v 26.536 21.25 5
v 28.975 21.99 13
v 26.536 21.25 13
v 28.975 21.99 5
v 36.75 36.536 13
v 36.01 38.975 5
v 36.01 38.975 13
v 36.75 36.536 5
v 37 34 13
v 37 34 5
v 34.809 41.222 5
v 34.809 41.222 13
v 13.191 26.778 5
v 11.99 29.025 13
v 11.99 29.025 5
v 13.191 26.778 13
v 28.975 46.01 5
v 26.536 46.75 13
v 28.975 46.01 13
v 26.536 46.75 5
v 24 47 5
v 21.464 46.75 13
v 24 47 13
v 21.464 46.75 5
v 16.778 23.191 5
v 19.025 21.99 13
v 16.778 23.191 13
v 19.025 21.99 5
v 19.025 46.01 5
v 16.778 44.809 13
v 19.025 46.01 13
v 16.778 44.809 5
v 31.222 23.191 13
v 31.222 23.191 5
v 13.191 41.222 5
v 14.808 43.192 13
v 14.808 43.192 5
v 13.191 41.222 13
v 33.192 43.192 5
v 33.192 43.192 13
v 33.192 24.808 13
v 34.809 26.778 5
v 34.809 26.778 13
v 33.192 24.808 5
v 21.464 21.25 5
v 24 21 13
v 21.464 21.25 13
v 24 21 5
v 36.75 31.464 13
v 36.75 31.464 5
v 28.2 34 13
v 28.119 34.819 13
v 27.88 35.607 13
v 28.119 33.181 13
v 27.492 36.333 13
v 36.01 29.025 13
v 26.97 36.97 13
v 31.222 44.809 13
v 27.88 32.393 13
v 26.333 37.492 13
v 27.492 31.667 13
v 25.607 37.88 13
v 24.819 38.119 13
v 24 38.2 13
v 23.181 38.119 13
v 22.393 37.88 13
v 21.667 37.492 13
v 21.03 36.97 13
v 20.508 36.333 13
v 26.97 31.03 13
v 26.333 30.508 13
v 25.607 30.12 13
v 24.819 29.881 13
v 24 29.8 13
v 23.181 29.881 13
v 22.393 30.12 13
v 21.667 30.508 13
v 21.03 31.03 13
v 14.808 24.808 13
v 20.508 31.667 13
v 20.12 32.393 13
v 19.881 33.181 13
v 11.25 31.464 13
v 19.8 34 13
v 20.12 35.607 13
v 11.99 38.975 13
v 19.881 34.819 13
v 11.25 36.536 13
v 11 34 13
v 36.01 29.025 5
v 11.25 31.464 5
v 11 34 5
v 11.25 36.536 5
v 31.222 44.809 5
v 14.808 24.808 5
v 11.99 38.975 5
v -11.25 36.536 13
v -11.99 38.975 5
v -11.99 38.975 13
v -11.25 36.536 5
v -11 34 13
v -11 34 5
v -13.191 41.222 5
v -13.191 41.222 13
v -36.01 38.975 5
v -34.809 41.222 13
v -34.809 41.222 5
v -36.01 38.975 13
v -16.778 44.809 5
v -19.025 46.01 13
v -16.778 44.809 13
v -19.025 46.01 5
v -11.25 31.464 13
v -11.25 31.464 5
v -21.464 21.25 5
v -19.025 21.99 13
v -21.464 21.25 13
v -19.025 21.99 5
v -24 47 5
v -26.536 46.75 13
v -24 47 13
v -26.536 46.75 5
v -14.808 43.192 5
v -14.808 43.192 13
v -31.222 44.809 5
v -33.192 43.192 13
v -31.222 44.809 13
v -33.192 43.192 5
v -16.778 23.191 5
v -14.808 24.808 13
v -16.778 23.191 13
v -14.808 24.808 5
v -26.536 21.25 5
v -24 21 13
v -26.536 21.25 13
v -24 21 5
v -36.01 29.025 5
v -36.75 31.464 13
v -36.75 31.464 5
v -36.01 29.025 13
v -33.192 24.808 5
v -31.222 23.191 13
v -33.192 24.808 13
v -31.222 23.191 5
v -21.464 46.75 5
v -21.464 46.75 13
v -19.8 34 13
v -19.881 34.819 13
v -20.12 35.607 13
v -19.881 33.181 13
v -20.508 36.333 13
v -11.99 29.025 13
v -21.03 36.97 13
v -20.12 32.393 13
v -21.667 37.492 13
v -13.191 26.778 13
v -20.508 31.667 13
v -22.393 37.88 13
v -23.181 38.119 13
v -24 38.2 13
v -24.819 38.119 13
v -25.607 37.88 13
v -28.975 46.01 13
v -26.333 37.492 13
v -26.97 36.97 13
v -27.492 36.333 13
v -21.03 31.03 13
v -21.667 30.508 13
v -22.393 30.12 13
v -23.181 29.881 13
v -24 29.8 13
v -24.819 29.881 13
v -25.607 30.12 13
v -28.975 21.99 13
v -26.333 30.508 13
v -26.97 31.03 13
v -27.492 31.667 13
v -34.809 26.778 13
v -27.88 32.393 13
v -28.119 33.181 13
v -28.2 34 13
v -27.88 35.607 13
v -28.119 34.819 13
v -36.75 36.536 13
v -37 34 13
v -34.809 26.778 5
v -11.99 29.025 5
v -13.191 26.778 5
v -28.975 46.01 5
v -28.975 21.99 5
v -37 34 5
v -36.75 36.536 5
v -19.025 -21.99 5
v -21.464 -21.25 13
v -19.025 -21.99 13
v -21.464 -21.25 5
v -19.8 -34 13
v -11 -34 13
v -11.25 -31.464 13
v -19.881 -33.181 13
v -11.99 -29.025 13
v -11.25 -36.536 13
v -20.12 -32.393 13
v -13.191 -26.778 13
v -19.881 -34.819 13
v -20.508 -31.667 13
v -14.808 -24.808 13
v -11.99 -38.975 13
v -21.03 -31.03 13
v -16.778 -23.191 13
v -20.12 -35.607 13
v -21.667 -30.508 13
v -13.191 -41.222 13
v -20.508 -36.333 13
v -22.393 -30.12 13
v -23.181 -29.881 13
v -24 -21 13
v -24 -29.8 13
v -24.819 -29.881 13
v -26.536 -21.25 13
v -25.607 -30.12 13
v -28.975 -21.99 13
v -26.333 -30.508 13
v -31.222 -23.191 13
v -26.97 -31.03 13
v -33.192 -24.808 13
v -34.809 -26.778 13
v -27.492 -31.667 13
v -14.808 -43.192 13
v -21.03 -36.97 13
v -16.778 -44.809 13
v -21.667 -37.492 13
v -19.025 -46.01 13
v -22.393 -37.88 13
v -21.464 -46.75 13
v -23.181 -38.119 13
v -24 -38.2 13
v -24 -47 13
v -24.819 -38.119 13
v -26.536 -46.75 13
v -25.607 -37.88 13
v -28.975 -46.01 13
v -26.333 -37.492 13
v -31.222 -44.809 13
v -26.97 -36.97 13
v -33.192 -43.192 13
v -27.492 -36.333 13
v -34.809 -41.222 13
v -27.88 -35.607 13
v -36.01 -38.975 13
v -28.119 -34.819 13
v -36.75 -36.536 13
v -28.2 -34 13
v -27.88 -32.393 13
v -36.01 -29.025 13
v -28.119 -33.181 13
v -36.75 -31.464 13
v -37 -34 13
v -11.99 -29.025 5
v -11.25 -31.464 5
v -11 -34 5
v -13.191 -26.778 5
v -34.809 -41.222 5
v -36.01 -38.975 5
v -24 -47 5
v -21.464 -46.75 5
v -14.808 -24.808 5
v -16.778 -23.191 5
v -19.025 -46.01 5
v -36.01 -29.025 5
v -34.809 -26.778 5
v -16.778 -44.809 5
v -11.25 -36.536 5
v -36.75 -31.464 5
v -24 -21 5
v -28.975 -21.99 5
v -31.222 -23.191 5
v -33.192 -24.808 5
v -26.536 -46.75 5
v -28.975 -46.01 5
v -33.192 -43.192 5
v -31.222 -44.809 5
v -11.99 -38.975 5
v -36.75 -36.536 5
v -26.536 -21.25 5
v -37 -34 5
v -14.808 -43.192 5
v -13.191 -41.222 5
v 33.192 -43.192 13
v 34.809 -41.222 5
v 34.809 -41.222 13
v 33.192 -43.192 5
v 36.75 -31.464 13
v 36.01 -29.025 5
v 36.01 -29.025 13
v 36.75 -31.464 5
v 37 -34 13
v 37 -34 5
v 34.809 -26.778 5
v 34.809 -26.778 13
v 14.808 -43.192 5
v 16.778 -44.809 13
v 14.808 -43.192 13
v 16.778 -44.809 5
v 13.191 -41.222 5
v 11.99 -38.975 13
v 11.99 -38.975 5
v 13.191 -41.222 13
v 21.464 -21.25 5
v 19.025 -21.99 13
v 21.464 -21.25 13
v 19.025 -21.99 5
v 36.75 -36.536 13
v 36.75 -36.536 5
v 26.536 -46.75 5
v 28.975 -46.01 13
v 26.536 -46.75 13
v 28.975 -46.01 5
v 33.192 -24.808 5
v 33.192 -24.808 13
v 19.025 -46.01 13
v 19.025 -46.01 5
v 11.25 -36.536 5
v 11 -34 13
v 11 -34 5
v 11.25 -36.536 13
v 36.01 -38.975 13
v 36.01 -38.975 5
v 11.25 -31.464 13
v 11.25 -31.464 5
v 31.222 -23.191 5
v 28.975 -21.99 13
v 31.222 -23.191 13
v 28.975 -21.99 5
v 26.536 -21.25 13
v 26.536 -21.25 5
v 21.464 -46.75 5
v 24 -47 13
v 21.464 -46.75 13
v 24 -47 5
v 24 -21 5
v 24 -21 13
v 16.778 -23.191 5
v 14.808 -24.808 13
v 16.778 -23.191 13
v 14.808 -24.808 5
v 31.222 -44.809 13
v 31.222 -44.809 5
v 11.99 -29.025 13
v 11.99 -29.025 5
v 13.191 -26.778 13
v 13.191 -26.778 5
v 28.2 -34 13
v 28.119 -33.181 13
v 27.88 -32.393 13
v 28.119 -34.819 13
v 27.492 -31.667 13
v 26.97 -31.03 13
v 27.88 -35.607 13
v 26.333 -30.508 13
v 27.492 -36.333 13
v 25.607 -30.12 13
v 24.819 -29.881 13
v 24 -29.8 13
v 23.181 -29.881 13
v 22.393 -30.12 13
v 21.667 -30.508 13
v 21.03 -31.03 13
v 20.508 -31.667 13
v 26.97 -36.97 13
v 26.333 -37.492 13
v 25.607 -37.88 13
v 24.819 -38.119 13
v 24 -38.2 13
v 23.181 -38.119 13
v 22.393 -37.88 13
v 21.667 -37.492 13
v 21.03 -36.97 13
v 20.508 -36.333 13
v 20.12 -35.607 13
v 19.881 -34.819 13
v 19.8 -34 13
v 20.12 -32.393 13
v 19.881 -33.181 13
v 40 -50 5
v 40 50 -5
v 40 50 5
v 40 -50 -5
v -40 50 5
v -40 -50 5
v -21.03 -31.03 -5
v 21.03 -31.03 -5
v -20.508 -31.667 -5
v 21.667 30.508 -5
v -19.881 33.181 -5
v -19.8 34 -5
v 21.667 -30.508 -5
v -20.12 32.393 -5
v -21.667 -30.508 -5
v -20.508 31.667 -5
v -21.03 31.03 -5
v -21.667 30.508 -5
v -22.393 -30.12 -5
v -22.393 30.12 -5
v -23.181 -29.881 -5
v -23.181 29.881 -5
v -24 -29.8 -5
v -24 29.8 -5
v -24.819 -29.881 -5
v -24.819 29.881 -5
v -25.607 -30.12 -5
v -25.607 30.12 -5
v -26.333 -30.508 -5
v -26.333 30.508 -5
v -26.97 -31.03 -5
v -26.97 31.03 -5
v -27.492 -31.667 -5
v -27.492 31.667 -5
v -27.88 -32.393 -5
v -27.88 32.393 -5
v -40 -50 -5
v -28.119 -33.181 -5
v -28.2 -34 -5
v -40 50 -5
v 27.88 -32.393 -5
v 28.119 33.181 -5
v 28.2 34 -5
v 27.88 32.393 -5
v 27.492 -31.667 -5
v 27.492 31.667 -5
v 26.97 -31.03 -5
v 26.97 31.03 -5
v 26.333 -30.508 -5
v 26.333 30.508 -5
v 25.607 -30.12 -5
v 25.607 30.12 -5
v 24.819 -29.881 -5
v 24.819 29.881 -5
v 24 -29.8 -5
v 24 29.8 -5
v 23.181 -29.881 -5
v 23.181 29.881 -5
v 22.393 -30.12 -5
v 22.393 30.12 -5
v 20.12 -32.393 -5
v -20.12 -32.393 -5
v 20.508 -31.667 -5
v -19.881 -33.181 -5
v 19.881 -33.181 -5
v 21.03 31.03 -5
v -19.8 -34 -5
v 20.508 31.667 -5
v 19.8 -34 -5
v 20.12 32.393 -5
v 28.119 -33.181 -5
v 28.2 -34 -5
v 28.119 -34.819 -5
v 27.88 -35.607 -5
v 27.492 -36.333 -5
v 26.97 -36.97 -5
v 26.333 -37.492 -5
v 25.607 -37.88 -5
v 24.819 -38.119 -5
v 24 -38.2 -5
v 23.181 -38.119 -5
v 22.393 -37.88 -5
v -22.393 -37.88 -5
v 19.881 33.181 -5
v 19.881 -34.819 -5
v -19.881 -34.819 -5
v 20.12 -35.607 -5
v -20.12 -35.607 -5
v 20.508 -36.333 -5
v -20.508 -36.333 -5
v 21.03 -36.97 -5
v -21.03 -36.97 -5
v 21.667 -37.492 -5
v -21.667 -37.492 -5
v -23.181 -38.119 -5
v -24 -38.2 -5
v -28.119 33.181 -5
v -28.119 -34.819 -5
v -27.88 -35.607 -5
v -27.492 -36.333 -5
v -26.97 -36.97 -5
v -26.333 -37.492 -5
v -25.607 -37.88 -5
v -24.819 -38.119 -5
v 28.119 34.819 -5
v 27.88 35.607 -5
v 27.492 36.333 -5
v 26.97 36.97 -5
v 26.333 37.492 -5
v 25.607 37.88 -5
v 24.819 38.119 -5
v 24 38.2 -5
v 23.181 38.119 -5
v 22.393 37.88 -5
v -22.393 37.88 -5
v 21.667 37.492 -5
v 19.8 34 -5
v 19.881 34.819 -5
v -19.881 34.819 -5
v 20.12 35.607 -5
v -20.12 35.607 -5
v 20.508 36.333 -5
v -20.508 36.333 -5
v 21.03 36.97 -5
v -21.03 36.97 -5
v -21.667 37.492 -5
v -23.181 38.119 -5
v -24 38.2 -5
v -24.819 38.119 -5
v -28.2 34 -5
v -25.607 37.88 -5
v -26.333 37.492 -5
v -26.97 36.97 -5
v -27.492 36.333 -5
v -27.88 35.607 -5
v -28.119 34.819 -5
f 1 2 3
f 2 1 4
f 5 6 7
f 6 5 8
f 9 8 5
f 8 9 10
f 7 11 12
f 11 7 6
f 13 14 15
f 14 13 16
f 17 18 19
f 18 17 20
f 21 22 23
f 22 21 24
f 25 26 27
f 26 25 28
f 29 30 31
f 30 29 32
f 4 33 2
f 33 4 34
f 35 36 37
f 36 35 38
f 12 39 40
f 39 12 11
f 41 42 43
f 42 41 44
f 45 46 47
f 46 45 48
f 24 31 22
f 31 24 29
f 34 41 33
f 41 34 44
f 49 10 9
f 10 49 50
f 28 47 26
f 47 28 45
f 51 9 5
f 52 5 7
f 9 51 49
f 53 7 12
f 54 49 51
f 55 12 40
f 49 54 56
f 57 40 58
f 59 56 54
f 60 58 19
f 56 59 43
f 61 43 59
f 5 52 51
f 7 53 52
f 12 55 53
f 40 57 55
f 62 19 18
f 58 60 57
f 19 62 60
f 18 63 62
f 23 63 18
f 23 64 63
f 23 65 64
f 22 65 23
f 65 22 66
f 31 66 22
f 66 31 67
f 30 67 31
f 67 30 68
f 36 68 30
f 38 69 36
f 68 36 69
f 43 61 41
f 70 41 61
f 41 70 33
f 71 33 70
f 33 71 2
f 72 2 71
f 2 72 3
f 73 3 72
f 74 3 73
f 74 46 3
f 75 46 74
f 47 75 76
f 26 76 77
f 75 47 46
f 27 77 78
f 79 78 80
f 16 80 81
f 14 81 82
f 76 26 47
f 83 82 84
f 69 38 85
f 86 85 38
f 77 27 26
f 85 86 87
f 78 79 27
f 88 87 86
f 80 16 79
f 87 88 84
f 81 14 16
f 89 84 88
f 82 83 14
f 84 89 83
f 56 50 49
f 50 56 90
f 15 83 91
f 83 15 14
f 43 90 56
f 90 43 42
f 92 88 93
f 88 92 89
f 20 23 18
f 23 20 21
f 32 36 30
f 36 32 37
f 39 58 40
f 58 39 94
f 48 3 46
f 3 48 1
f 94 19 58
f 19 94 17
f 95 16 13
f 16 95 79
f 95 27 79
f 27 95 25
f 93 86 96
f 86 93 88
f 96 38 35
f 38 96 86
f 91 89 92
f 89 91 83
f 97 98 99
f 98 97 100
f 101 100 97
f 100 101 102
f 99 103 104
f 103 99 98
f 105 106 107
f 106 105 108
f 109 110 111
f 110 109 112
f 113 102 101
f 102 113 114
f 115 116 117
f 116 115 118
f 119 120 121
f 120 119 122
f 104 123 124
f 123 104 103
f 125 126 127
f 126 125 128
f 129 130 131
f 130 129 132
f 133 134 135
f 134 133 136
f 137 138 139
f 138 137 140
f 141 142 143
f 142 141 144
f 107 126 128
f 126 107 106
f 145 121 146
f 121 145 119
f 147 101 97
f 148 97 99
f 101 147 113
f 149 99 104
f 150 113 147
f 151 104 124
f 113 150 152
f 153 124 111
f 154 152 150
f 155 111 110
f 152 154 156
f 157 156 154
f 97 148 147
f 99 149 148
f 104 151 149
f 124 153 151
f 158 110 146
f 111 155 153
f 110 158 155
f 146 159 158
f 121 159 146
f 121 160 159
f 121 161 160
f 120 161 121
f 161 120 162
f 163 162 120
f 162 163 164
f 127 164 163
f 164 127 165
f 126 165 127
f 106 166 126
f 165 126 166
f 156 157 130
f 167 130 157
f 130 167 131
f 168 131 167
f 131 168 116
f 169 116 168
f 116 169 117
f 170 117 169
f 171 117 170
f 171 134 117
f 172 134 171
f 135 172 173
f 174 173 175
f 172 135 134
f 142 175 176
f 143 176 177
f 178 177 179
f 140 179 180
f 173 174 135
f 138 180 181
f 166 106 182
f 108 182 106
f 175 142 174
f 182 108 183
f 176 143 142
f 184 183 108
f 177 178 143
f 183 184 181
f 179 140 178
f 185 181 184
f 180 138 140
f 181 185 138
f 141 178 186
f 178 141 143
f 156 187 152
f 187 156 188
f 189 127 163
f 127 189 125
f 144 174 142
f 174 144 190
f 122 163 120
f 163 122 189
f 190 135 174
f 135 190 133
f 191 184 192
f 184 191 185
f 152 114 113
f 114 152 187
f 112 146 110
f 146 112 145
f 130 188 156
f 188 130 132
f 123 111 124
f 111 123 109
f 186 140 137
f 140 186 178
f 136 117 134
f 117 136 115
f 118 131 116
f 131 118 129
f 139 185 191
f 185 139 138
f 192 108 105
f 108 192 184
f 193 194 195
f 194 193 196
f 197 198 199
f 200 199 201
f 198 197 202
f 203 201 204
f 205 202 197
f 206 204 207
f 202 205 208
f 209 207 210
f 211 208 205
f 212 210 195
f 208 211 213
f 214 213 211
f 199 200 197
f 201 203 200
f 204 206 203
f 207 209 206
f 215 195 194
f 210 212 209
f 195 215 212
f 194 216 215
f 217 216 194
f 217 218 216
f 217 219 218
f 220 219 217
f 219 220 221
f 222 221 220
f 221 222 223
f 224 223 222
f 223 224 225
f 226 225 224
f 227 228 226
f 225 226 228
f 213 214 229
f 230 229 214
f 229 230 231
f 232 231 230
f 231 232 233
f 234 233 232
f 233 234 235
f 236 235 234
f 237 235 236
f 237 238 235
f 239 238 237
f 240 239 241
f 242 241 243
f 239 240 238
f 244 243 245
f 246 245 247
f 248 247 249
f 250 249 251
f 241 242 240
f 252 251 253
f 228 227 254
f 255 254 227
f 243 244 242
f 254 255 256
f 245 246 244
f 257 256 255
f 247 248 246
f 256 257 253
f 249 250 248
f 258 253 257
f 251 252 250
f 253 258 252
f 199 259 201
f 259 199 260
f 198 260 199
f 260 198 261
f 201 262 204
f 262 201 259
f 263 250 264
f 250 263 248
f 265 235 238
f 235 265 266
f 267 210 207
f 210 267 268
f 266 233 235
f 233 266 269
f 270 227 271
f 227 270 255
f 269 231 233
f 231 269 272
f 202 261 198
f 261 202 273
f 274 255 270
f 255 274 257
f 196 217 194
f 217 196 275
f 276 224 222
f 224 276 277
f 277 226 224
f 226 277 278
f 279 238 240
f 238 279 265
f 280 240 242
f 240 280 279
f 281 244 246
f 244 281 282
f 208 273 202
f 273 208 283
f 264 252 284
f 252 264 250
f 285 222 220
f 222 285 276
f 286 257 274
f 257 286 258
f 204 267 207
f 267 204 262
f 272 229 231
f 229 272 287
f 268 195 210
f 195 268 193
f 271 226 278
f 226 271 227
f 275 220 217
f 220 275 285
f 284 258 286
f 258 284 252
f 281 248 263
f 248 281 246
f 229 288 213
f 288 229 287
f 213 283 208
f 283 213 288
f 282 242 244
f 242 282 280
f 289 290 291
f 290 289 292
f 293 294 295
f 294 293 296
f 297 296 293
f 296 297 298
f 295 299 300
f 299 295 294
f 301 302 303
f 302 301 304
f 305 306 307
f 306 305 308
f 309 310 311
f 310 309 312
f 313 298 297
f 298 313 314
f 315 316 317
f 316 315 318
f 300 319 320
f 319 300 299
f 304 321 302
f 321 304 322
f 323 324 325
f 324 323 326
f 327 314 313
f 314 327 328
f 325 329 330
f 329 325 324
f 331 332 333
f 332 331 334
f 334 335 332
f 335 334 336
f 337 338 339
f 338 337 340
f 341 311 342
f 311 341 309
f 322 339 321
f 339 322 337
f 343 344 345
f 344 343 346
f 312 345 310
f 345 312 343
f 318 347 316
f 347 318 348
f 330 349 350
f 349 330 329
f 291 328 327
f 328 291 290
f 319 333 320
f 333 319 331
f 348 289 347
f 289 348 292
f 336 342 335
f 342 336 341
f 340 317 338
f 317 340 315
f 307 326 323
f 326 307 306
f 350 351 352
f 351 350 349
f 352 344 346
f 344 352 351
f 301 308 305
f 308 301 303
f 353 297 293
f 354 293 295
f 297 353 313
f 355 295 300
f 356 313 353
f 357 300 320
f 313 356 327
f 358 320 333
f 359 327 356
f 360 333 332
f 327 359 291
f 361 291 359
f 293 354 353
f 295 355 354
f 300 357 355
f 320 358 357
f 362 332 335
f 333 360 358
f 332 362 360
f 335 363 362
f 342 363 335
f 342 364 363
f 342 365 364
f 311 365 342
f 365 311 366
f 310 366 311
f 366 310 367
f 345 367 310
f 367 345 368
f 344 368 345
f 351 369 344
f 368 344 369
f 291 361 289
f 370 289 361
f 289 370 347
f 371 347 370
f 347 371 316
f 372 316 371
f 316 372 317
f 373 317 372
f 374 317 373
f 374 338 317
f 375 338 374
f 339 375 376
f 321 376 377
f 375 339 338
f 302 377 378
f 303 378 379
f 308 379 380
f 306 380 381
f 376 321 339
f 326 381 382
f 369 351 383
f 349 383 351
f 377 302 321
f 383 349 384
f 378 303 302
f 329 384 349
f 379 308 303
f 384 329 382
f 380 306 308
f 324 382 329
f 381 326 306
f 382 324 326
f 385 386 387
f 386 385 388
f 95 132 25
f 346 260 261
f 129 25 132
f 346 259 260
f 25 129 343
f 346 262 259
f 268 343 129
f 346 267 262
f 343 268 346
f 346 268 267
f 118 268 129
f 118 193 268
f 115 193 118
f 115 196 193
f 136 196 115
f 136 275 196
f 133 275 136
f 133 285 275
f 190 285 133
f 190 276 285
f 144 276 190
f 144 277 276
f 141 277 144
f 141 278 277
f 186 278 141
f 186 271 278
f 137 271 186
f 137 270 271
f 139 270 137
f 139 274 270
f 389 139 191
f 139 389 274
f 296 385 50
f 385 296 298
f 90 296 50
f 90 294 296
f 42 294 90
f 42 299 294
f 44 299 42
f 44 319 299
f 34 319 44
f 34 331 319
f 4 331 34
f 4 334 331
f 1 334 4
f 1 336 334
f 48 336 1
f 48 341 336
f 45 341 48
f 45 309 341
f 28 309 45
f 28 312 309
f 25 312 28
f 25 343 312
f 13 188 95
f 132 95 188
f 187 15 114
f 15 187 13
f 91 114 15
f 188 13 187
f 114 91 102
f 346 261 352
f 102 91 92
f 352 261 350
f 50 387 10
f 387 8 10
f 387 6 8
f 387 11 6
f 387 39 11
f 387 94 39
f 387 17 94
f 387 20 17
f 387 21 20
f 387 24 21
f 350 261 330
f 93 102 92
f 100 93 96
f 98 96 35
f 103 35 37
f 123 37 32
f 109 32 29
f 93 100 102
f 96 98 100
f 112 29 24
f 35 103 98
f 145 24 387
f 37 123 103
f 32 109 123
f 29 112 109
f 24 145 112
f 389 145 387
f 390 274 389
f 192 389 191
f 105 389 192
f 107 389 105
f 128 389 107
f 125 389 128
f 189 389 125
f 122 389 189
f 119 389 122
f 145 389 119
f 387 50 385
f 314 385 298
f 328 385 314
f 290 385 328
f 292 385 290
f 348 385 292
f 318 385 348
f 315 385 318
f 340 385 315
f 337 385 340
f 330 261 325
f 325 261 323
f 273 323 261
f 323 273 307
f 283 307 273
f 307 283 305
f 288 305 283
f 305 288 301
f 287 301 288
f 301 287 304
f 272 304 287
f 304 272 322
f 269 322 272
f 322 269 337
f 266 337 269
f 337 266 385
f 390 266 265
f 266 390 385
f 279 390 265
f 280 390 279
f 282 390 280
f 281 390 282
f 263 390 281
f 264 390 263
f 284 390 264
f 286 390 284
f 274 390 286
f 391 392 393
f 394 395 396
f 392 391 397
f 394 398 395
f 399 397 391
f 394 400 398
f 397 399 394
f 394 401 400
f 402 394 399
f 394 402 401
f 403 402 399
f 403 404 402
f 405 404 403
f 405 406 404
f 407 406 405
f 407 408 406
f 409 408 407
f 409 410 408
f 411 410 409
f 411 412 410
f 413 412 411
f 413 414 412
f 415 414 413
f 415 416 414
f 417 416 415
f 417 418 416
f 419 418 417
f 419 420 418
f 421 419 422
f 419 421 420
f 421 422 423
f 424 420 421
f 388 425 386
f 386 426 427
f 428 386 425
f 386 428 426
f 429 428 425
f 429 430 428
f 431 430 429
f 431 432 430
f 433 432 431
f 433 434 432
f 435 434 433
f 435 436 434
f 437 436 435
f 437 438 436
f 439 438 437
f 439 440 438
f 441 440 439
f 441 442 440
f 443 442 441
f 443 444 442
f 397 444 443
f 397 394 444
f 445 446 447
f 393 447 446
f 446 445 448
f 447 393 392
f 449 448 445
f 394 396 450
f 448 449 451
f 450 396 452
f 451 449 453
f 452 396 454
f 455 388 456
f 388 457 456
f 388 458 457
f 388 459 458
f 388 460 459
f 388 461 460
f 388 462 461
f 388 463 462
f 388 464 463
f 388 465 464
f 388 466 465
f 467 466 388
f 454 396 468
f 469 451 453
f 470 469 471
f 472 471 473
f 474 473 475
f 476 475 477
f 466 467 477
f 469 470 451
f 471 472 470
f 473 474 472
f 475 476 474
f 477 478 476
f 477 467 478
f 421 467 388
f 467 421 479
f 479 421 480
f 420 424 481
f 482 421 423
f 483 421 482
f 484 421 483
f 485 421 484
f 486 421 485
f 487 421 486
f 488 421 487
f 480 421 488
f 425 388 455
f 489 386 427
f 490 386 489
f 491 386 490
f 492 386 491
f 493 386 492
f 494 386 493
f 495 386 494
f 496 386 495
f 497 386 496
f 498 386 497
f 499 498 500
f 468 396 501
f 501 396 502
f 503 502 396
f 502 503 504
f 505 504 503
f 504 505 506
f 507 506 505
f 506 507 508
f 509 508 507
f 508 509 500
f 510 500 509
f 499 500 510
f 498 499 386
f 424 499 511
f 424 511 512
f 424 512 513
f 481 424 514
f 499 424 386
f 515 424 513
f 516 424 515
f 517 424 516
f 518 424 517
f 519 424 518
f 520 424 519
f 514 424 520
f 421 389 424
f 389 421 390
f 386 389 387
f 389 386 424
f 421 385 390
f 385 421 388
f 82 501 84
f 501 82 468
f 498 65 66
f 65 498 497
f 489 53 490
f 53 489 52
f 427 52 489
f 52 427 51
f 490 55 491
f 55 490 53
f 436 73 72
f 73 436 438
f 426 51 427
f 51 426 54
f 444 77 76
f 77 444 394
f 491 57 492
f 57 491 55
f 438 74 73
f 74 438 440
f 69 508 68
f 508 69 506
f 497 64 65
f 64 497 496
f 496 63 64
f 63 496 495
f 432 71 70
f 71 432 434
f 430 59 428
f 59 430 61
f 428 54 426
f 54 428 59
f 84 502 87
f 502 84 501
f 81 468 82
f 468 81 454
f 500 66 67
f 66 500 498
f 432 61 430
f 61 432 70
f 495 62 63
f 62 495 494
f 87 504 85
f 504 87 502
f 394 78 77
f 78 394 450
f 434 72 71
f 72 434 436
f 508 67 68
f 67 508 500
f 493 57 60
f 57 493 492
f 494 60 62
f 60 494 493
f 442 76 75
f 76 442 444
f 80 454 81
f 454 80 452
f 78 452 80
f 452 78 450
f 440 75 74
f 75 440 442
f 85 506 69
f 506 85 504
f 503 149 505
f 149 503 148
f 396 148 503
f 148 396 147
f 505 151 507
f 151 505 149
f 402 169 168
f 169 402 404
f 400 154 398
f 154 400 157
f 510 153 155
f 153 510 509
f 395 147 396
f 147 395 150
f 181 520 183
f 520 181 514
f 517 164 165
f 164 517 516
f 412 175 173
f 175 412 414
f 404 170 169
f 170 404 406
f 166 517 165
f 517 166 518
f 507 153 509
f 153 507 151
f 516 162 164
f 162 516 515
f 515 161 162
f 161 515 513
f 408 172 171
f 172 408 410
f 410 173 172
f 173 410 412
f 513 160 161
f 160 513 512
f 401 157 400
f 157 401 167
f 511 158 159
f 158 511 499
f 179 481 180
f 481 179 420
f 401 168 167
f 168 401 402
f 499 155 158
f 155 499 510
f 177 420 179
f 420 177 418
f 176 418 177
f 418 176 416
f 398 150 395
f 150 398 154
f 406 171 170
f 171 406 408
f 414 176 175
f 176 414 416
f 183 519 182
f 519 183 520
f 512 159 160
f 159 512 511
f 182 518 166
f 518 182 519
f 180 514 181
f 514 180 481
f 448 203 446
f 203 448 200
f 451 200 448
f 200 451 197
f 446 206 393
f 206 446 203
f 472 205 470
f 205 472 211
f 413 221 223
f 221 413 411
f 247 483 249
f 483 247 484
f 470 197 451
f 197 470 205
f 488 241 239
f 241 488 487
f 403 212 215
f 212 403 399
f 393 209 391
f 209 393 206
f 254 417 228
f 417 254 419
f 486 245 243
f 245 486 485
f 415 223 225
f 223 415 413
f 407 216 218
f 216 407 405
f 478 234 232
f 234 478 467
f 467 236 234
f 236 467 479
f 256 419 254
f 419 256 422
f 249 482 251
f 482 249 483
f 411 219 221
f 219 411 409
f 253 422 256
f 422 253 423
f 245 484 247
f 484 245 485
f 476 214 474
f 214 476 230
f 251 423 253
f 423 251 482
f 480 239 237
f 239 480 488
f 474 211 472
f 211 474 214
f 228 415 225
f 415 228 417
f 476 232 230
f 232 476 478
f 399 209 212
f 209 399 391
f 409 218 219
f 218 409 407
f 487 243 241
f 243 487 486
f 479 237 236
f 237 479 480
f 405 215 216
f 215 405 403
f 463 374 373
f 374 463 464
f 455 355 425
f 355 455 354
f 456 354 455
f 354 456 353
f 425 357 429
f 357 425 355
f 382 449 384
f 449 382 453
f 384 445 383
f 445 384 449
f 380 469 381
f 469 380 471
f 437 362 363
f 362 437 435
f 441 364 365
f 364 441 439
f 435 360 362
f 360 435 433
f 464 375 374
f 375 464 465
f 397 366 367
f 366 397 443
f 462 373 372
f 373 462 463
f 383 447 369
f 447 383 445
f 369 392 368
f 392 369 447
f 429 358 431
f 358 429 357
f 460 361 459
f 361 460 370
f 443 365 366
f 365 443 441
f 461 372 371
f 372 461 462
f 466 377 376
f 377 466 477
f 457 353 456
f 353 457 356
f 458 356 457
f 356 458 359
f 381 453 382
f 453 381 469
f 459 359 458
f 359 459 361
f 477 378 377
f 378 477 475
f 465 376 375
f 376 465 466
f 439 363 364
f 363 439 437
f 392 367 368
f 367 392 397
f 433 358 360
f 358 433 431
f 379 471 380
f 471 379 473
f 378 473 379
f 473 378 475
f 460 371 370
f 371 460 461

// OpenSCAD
$fn = 32;

// ----------------------------------------------------------------------
// Anchor pads 80 x 100 x 18
// four corner bosses with anchor holes
// ----------------------------------------------------------------------

// --- parameters (mm) ---
plate = [80, 100, 10];  // base plate size (x, y, z)
pads = 4;               // boss count, one per corner
edge = 16;              // boss centre offset from the plate edge
boss_d = 26;            // boss diameter
boss_h = 8;             // boss height above the base plate
hole_d = 8.4;           // hole diameter

// --- derived feature positions (mm) ---
height = plate[2] + boss_h;      // = 18   overall height of the part
corner_x = plate[0] / 2 - edge;  // = 24   boss centre X
corner_y = plate[1] / 2 - edge;  // = 34   boss centre Y
feature_centers = [
  [corner_x, corner_y],
  [-corner_x, corner_y],
  [-corner_x, -corner_y],
  [corner_x, -corner_y]
];   // boss centres, anchor holes are drilled there

// base plate, four bosses standing on it, anchor holes all the way through
difference() {
  union() {
    cube(plate, center = true);
    for (centre = feature_centers)
      translate([centre[0], centre[1], plate[2] / 2 - 1])
        cylinder(d = boss_d, h = boss_h + 1);
  }
  for (centre = feature_centers)
    translate([centre[0], centre[1], -height])
      cylinder(d = hole_d, h = 2 * height + 2);  // through boss and plate
}
